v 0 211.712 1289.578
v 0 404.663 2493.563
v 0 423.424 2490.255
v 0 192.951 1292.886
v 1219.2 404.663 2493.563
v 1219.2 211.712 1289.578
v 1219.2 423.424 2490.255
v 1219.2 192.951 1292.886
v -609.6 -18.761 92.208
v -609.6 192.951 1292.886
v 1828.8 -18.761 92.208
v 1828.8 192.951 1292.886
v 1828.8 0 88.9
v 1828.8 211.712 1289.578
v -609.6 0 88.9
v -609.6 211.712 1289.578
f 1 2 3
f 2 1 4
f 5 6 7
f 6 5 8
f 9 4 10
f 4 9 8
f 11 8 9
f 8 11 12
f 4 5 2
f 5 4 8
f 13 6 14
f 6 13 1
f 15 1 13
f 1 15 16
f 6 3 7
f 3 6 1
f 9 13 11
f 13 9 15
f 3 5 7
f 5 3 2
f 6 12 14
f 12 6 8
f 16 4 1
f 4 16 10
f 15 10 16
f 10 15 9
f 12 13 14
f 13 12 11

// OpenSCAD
// Title: Open Source Panel Saw
// License: This is design is in the public domain
// Author: Phil Showers

// Global Variables
$fn = 90;
in2mm=25.4;
plywoodSheet = [48*in2mm, 96*in2mm, .75*in2mm];
2x4 = [3.5*in2mm,92*in2mm,1.5*in2mm];




translate([0,0,2x4.x])
    union(){
        rotate([80,0,0])cube(plywoodSheet);
        rotate([-10,0,0])translate([-plywoodSheet.x/2,0,plywoodSheet.x])rotate([90,90,0])color("blue")cube(plywoodSheet);
}
